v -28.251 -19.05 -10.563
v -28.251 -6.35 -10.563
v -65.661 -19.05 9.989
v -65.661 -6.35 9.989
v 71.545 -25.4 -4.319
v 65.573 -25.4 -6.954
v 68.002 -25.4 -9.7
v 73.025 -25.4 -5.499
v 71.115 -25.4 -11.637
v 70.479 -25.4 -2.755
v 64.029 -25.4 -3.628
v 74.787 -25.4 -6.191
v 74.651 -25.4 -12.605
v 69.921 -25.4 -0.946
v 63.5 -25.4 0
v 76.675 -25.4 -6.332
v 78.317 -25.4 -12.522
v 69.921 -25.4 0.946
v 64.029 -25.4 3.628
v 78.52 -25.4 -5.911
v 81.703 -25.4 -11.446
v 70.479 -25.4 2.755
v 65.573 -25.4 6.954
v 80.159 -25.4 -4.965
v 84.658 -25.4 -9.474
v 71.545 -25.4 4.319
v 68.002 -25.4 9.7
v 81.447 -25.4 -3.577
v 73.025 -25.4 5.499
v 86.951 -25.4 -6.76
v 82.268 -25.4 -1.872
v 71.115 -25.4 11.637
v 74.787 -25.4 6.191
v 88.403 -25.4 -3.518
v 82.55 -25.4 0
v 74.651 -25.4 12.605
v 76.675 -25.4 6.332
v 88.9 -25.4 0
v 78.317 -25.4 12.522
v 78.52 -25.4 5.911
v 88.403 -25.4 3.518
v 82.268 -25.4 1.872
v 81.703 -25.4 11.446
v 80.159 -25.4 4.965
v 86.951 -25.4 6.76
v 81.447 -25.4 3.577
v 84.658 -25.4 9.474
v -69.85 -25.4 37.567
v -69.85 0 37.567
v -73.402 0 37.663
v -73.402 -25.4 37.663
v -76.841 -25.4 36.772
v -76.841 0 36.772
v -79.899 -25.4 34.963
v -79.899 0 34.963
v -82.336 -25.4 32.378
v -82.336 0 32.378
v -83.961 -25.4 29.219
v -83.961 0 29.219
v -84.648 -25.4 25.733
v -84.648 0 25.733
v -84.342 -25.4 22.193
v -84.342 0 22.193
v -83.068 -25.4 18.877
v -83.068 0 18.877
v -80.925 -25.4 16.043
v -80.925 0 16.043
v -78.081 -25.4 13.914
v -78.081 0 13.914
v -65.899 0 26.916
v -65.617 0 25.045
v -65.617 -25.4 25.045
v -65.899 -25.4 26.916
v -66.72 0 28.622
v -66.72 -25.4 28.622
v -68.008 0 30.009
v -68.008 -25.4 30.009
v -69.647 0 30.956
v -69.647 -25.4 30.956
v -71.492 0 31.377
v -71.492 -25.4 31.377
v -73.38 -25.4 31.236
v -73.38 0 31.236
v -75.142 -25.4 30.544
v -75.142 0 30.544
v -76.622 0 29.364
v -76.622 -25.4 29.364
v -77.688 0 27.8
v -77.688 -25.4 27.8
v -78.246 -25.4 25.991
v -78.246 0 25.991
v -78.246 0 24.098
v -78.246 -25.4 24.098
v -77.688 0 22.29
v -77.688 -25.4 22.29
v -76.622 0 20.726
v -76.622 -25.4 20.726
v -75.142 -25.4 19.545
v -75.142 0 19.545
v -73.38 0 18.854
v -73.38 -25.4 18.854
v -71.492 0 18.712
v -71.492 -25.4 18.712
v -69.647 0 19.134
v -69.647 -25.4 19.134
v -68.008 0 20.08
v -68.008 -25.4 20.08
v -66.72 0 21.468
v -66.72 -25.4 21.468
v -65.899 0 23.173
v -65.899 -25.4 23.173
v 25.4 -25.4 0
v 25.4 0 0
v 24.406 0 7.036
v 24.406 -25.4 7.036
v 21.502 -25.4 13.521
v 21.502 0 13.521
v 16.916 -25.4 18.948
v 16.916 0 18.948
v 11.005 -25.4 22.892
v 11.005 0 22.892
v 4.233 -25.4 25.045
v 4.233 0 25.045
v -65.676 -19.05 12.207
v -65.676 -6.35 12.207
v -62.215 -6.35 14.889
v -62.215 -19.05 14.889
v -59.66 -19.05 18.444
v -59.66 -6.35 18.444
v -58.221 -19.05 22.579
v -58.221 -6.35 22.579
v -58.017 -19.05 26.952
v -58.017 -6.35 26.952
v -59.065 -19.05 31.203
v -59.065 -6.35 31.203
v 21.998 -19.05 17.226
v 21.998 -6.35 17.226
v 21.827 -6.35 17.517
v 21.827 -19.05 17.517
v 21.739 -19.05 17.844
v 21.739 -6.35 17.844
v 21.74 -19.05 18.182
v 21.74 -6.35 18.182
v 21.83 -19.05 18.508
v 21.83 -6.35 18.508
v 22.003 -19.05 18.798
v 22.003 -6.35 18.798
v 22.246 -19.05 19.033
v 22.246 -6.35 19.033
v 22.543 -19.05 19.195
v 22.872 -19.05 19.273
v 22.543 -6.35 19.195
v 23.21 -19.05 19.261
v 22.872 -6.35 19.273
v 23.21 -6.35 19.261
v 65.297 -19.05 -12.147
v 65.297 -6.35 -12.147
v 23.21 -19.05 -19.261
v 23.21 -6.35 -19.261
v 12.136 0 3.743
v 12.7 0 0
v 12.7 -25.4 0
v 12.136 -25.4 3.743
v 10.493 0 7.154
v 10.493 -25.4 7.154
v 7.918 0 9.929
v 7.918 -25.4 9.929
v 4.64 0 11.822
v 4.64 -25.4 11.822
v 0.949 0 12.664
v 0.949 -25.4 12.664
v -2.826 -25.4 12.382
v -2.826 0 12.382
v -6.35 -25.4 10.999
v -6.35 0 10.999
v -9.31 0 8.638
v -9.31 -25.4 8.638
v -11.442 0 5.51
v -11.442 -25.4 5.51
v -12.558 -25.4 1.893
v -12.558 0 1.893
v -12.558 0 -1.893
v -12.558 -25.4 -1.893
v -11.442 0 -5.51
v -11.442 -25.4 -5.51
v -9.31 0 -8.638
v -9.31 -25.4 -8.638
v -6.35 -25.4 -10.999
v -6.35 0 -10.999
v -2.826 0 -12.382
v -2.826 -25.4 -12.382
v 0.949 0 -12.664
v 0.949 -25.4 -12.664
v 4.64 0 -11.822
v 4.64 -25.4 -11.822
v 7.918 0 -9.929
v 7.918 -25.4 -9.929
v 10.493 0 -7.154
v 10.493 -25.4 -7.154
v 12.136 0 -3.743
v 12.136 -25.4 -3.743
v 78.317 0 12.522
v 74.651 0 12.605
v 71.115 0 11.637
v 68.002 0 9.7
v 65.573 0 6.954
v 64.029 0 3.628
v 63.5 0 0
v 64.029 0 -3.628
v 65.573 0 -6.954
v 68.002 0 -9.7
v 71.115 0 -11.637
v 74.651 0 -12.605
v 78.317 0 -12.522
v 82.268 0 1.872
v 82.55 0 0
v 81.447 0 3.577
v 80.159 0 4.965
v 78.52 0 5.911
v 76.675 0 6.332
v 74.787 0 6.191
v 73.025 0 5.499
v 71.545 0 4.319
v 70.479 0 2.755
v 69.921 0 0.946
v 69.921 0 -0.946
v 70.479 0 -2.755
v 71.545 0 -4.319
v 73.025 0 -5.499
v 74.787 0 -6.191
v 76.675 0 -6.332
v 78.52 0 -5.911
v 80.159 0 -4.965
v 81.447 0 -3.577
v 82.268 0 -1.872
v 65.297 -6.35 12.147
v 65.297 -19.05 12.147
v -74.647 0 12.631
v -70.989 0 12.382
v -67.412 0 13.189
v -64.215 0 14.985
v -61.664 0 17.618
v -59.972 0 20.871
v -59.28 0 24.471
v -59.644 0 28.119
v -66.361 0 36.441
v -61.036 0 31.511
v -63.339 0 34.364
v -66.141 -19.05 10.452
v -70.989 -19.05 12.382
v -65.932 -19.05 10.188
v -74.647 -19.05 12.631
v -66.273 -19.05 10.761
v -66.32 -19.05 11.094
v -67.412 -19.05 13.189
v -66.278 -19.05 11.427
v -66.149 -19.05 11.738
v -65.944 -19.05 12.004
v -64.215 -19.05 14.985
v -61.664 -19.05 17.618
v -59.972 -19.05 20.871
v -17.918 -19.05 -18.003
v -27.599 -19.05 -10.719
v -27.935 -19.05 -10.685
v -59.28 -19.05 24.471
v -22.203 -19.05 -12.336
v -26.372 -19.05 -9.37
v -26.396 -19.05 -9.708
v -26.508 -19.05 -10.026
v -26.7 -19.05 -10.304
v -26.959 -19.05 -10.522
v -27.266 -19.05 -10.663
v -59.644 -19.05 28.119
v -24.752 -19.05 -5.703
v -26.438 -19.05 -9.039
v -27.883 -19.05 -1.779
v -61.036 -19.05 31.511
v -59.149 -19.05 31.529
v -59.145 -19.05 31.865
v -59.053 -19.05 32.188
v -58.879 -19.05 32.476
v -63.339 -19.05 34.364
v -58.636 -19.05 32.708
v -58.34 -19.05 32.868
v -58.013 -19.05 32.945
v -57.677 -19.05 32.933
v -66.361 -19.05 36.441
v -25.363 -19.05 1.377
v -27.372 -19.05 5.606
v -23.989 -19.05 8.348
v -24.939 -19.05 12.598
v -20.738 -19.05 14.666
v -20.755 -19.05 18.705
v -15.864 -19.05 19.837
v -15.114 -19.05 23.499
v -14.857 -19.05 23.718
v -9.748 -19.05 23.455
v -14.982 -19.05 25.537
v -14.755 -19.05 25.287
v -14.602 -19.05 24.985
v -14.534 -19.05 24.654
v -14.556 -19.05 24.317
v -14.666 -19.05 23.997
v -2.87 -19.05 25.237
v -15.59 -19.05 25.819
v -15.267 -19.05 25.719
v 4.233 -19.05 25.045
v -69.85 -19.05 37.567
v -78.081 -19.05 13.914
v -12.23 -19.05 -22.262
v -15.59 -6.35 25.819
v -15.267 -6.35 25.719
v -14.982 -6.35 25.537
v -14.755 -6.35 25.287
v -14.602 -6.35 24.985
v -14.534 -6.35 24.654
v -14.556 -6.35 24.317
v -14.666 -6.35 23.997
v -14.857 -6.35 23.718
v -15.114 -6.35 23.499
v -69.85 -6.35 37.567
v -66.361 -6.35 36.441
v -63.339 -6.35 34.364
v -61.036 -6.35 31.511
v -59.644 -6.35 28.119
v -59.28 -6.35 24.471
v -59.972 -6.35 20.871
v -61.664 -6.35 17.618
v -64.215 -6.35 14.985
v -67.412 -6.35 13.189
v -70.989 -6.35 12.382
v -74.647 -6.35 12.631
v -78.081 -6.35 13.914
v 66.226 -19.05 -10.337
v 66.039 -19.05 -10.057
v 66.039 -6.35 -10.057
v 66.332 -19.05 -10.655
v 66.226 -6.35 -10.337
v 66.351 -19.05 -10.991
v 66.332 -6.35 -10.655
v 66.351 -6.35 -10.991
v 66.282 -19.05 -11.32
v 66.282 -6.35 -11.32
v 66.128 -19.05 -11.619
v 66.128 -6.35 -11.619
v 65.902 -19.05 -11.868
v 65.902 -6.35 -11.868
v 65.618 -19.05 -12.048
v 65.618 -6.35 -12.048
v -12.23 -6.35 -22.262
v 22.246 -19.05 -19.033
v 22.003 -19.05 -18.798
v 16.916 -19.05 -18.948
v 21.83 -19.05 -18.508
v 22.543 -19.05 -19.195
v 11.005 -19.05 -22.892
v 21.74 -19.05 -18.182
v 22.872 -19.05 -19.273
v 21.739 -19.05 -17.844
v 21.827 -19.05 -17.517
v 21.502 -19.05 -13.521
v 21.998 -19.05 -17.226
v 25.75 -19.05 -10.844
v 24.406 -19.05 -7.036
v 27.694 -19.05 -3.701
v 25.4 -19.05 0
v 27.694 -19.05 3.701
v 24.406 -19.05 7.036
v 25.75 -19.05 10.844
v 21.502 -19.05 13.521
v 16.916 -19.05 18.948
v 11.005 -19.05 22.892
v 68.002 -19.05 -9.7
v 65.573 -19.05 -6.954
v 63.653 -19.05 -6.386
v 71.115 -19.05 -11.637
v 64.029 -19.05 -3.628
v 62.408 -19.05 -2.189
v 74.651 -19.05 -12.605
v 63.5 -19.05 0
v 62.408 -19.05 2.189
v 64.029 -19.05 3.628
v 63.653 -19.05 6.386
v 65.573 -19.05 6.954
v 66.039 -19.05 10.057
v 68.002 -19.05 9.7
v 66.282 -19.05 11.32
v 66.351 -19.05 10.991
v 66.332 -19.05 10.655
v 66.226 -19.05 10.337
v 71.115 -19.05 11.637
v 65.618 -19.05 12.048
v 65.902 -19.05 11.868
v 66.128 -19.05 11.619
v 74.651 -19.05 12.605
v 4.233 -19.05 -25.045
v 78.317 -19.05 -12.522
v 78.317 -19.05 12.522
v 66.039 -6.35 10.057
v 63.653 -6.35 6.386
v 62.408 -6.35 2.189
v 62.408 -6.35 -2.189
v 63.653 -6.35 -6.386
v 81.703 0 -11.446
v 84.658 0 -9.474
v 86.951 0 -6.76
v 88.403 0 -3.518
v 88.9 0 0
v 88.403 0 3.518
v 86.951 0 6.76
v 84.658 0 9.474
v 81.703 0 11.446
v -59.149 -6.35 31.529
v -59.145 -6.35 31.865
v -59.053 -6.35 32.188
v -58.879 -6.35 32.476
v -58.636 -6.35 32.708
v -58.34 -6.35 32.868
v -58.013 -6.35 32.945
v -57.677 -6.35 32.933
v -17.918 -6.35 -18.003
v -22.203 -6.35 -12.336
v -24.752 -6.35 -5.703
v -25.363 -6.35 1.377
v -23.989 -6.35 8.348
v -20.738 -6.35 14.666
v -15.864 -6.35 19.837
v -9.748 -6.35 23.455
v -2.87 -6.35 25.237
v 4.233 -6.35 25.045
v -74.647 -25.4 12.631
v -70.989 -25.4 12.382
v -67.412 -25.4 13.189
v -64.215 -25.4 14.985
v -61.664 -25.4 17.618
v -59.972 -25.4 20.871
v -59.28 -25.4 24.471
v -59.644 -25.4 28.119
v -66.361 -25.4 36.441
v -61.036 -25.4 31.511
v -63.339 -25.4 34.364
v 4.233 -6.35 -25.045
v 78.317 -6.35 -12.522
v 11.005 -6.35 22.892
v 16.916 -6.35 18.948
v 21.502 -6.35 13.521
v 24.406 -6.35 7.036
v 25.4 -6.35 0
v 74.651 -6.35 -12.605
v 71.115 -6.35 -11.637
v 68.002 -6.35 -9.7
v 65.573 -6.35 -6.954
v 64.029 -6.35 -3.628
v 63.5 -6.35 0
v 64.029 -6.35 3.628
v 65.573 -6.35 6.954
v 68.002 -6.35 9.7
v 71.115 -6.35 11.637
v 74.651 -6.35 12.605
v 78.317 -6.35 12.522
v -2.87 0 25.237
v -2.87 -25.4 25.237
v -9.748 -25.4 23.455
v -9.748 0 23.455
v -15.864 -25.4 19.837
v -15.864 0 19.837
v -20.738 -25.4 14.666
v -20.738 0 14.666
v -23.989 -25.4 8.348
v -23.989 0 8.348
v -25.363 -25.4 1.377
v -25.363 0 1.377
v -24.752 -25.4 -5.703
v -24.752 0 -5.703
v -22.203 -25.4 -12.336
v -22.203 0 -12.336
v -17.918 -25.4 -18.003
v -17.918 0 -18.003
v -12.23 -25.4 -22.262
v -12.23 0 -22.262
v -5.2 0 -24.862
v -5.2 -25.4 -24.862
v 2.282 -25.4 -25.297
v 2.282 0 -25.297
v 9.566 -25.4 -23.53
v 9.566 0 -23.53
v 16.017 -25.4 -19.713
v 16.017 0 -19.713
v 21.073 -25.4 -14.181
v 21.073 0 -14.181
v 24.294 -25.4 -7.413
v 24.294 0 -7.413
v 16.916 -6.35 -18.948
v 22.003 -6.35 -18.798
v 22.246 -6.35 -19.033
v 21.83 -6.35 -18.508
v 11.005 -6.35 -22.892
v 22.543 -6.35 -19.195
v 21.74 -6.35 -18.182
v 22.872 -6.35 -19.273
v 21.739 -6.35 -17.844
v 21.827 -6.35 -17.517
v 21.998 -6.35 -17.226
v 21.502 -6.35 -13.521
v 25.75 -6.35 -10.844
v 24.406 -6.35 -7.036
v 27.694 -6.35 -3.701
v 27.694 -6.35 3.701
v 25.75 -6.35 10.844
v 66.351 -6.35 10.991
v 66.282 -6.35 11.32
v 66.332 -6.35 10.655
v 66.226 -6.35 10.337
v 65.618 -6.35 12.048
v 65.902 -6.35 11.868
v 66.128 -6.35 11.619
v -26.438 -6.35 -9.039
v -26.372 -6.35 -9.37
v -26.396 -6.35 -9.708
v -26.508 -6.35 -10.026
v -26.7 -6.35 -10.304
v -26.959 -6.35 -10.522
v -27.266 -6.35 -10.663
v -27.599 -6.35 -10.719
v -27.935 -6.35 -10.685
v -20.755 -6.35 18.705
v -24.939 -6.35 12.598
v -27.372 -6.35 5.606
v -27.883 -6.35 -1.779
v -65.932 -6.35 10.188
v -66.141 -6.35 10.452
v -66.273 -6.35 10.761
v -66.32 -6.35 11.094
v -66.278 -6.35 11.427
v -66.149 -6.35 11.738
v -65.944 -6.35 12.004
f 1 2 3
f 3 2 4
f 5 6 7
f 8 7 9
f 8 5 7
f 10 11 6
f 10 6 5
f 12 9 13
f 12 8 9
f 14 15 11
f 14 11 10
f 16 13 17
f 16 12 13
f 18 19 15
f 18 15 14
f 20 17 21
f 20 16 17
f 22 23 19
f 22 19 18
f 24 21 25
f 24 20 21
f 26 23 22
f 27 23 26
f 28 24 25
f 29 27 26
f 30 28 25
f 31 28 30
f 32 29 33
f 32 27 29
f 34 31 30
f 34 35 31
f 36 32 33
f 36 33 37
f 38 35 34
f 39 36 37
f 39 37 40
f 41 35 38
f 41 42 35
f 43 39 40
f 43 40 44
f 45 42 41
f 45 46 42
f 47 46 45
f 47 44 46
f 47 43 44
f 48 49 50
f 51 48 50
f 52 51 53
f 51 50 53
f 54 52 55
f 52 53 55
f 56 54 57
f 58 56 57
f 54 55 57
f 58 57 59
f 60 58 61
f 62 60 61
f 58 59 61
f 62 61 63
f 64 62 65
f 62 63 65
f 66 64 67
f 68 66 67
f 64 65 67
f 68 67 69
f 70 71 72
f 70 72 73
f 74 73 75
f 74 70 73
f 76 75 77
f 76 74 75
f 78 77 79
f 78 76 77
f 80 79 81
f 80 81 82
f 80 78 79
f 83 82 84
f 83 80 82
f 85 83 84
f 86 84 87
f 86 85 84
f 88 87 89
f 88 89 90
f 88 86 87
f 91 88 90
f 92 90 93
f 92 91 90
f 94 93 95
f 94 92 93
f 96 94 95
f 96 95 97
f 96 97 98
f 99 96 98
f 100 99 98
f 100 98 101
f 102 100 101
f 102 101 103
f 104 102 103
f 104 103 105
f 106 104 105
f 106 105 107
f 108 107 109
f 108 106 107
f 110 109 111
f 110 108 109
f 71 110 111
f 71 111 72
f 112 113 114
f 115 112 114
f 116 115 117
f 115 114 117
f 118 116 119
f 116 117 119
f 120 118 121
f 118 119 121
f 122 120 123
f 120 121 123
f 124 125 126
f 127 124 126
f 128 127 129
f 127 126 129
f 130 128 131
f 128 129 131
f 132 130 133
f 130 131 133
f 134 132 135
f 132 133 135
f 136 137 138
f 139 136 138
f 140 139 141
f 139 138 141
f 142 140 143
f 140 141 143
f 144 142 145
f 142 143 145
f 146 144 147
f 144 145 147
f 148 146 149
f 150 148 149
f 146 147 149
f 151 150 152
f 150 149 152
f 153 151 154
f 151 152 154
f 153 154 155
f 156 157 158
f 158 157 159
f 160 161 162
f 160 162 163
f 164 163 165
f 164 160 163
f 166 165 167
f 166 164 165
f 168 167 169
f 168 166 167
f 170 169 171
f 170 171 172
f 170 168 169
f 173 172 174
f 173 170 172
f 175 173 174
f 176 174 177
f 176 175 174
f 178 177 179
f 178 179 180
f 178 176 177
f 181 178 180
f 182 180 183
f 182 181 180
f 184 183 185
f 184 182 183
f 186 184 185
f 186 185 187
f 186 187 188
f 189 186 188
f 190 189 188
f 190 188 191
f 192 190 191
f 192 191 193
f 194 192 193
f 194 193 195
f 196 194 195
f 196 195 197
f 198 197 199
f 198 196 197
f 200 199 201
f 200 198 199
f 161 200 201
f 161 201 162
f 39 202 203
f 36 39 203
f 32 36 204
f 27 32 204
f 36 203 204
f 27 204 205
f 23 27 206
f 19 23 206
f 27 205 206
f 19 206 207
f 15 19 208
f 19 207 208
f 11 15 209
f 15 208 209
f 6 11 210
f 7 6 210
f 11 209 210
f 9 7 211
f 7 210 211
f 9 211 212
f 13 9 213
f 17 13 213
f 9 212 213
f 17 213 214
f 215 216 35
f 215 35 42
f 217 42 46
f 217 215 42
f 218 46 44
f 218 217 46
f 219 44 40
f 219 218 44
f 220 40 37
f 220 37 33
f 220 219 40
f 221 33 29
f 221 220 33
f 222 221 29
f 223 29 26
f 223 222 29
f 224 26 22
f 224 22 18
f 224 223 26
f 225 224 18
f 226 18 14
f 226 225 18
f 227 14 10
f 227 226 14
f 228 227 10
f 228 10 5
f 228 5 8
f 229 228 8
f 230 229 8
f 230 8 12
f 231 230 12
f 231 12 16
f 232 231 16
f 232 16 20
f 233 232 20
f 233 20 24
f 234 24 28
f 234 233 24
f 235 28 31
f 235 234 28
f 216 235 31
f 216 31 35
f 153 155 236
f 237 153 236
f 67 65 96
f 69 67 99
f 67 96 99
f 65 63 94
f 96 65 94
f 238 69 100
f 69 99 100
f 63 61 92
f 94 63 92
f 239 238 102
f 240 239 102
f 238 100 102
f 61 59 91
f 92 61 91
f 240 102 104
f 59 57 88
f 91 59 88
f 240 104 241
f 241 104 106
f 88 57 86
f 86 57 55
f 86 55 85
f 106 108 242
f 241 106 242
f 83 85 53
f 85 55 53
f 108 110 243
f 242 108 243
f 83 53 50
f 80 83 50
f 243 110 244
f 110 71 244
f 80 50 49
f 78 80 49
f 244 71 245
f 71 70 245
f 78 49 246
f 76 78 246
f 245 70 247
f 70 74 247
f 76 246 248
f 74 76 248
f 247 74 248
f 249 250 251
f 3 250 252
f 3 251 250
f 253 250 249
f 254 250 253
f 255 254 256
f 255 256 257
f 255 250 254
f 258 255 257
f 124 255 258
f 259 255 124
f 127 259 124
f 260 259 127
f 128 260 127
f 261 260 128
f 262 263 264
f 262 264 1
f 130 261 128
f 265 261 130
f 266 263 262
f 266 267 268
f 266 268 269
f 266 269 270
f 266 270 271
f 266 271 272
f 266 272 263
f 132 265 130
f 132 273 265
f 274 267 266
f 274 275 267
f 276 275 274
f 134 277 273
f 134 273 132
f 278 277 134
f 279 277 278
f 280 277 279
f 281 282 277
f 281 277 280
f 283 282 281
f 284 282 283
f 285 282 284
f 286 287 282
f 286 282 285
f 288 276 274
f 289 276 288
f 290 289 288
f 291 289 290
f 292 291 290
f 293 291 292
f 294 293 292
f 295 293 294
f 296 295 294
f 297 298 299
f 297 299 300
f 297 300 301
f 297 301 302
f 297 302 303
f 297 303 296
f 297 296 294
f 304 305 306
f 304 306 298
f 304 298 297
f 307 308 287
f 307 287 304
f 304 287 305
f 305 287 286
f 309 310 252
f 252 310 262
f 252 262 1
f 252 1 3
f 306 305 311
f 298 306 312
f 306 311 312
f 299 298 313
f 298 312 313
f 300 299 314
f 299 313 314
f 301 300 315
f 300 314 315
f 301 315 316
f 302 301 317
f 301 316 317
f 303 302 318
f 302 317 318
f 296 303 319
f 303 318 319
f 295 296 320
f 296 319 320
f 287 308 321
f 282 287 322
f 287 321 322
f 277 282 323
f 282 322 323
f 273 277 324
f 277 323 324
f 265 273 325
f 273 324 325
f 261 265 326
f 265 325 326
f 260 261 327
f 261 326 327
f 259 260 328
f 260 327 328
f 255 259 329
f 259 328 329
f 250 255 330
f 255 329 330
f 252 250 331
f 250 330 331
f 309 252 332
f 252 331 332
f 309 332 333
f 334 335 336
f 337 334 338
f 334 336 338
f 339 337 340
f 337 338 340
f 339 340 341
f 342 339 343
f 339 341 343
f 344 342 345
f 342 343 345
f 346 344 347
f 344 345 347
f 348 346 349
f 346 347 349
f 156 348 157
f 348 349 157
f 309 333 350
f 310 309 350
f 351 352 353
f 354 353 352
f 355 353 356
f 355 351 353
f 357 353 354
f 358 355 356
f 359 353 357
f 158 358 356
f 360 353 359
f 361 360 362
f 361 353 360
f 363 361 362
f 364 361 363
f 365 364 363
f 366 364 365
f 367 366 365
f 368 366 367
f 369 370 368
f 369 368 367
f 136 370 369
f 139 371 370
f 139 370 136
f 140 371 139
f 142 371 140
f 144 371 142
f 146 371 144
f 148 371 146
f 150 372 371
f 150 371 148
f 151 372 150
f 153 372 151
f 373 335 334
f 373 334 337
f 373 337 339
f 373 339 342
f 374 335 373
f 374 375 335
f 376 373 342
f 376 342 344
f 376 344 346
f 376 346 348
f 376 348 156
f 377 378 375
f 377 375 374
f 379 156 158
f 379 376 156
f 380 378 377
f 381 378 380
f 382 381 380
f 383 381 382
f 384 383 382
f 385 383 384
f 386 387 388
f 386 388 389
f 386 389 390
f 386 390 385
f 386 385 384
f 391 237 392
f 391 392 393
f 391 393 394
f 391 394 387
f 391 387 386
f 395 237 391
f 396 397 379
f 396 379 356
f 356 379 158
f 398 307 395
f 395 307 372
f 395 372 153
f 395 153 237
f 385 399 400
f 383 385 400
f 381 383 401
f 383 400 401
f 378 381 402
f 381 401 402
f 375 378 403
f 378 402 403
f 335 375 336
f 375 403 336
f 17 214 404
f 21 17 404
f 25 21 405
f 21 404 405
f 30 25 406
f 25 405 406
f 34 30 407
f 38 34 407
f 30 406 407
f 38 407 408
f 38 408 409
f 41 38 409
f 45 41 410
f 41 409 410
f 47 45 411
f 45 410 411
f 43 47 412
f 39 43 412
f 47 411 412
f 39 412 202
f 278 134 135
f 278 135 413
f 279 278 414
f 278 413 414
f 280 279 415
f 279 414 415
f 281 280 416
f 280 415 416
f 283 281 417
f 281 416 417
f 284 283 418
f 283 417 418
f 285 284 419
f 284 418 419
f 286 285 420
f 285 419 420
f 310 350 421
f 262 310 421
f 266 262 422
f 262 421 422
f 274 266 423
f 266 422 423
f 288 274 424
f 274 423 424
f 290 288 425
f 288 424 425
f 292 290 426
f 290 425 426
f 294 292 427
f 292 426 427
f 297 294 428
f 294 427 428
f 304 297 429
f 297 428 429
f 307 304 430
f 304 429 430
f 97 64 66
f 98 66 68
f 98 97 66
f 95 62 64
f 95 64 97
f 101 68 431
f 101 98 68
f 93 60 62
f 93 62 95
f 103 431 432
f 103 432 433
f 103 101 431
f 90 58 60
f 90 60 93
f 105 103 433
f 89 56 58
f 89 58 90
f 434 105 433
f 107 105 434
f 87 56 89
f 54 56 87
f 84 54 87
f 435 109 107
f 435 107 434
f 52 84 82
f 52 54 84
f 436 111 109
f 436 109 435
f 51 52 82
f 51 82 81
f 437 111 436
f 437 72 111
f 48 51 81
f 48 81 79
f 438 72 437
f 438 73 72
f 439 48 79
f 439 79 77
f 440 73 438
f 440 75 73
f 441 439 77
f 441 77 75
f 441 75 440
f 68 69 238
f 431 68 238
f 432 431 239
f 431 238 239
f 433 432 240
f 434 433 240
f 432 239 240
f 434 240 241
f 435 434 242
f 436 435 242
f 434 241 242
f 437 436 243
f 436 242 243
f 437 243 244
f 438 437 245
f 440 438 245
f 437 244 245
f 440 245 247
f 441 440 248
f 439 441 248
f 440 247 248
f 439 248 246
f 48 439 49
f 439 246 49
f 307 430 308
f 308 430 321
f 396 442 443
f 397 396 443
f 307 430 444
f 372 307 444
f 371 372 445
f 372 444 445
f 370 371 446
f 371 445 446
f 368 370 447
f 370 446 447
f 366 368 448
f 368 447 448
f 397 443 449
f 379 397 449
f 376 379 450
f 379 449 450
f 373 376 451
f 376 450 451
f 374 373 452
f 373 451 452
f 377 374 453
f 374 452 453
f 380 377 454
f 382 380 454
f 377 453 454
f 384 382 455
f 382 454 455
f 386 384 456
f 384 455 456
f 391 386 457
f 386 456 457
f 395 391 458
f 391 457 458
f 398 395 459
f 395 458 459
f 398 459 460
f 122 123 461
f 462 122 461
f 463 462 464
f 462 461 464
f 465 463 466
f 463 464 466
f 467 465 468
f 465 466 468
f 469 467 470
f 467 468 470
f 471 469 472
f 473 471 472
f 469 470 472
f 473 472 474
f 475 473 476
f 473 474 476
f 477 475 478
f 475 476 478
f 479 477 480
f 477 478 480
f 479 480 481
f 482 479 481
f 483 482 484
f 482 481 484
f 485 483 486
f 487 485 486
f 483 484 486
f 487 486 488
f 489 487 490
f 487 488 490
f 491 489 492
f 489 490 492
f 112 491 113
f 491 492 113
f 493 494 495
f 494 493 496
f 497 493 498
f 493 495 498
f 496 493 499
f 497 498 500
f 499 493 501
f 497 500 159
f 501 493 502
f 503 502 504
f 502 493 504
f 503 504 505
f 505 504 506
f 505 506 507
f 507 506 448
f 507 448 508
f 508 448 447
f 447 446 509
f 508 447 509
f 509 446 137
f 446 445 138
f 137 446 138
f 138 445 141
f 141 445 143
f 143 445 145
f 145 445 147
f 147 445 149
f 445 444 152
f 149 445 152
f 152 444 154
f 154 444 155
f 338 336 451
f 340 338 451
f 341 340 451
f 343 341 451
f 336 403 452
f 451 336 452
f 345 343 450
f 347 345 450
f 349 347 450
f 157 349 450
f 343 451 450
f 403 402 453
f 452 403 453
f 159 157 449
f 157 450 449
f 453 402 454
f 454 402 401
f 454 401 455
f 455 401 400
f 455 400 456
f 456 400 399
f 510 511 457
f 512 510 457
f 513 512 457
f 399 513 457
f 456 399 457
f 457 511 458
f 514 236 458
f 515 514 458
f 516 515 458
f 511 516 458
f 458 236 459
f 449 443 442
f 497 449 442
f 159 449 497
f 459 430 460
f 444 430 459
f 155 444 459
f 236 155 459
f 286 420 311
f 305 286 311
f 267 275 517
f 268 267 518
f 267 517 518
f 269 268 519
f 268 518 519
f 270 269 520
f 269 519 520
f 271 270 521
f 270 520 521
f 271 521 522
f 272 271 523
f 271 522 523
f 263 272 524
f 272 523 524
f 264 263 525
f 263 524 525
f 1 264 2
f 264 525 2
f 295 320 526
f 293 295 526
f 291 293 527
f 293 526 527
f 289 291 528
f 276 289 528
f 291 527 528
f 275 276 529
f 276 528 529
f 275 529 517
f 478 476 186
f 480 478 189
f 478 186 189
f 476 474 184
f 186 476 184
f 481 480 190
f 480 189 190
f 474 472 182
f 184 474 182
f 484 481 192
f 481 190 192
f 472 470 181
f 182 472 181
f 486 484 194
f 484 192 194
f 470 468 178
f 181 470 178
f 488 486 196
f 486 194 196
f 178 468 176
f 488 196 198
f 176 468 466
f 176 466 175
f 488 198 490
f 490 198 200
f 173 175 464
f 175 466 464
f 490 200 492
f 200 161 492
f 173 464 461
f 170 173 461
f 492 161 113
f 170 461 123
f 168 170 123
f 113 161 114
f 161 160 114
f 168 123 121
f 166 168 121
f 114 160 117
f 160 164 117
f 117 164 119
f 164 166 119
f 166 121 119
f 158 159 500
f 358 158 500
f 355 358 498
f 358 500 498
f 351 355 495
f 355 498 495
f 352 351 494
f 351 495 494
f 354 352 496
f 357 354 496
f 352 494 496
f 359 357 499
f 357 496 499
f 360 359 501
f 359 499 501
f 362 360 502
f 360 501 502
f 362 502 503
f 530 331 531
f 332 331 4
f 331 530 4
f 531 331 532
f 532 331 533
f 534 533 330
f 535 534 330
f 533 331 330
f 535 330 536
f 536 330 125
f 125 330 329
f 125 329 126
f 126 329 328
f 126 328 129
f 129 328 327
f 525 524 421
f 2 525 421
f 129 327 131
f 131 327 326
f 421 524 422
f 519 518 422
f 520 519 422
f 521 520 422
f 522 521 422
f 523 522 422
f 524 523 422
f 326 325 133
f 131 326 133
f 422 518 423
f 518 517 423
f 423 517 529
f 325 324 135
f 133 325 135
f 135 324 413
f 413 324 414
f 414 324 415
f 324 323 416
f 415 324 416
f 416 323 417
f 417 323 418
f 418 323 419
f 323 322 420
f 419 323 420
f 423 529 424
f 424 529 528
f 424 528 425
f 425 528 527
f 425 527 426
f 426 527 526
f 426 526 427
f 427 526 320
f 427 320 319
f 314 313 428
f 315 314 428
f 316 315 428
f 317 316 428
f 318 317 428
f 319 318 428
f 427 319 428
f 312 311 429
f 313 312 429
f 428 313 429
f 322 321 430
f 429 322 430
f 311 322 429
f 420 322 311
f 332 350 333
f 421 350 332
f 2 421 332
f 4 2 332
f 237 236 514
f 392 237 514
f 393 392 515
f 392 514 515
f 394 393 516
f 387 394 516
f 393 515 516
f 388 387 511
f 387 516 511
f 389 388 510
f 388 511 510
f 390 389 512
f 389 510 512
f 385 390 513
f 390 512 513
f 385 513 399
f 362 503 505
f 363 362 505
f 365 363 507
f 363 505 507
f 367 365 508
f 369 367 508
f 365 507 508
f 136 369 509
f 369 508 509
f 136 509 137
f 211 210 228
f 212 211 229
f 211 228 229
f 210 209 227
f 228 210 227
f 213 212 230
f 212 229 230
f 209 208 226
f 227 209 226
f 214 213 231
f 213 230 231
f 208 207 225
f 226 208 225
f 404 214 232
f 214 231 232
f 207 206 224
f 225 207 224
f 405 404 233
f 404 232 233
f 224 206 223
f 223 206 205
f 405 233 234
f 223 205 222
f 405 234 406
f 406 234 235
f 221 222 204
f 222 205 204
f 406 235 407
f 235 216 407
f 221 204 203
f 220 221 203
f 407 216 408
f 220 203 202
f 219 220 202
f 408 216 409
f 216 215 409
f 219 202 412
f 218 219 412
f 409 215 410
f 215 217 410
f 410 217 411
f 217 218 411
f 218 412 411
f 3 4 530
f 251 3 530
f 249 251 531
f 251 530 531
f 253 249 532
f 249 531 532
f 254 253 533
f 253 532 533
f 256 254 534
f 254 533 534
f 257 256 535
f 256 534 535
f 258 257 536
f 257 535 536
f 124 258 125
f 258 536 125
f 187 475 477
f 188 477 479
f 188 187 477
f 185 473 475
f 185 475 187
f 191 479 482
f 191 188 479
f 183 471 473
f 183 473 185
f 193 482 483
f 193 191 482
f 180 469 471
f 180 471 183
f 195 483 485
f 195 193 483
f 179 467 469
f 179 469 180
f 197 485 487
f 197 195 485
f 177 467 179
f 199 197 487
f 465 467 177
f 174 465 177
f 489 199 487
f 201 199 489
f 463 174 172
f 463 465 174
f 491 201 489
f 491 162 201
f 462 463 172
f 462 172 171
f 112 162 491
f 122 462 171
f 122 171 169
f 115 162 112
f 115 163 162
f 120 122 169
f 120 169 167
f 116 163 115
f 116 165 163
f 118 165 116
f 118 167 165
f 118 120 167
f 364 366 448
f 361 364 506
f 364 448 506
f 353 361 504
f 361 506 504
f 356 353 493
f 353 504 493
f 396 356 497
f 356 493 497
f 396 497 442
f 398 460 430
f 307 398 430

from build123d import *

# Parameters (mm, degrees)
F0_R     = 12.7
F1_DEPTH = 25.4
F0_R_2   = 6.35
F2_DEPTH = 25.4
F3_DEPTH = 6.35
F4_DEPTH = 6.35


with BuildPart() as f1:
    # F0 (on Front) → F1 (new body)
    with BuildSketch(Plane.XZ):
        with BuildLine():
            ThreePointArc((4.2333333333, -25.0447377485), (19.399570442, -16.3956294989), (25.4, 0))
            ThreePointArc((25.4, 0), (19.399570442, 16.3956294989), (4.2333333333, 25.0447377485))
            ThreePointArc((4.2333333333, 25.0447377485), (-23.9888888889, 8.3482459162), (-12.2296296296, -22.2619891097))
            ThreePointArc((-12.2296296296, -22.2619891097), (-4.2333333333, -25.0447377485), (4.2333333333, -25.0447377485))
        make_face()
        Circle(F0_R, mode=Mode.SUBTRACT)
    extrude(amount=F1_DEPTH)


with BuildPart() as f1b:
    # F0 (on Front) → F1, piece 2 (new body)
    with BuildSketch(Plane.XZ):
        with BuildLine():
            ThreePointArc((88.9, 0), (85.899785221, 8.1978147495), (78.3166666667, 12.5223688742))
            ThreePointArc((78.3166666667, 12.5223688742), (63.5, 0), (78.3166666667, -12.5223688742))
            ThreePointArc((78.3166666667, -12.5223688742), (85.899785221, -8.1978147495), (88.9, 0))
        make_face()
        with Locations((76.2, 0)):
            Circle(F0_R_2, mode=Mode.SUBTRACT)
    extrude(amount=F1_DEPTH)


with BuildPart() as f1c:
    # F0 (on Front) → F1, piece 3 (new body)
    with BuildSketch(Plane.XZ):
        with BuildLine():
            ThreePointArc((-59.2666666667, 25.0447377485), (-62.2668814457, 33.2425524979), (-69.85, 37.5671066227))
            ThreePointArc((-69.85, 37.5671066227), (-83.9611111111, 29.2188607065), (-78.0814814815, 13.9137431936))
            ThreePointArc((-78.0814814815, 13.9137431936), (-65.500143186, 14.1143180825), (-59.2666666667, 25.0447377485))
        make_face()
        with Locations((-71.9666666667, 25.0447377485)):
            Circle(F0_R_2, mode=Mode.SUBTRACT)
    extrude(amount=F1_DEPTH)


with BuildPart() as f2:
    # F0 (on Front) → F2 (new body)
    with BuildSketch(Plane.XZ):
        with BuildLine():
            ThreePointArc((4.2333333333, 25.0447377485), (19.399570442, 16.3956294989), (25.4, 0))
            ThreePointArc((25.4, 0), (19.399570442, -16.3956294989), (4.2333333333, -25.0447377485))
            Line((4.2333333333, -25.0447377485), (78.3166666667, -12.5223688742))
            ThreePointArc((78.3166666667, -12.5223688742), (63.5, 0), (78.3166666667, 12.5223688742))
            Line((78.3166666667, 12.5223688742), (4.2333333333, 25.0447377485))
        make_face()
        with BuildLine():
            ThreePointArc((21.9979949155, 17.2259054826), (21.9066318734, 18.6585361887), (23.209570442, 19.2611380738))
            Line((23.209570442, 19.2611380738), (65.296593229, 12.1471327984))
            ThreePointArc((65.296593229, 12.1471327984), (66.281659176, 11.320020659), (66.0391490163, 10.0568269947))
            ThreePointArc((66.0391490163, 10.0568269947), (62.2498184639, 0), (66.0391490163, -10.0568269947))
            ThreePointArc((66.0391490163, -10.0568269947), (66.281659176, -11.320020659), (65.296593229, -12.1471327984))
            Line((65.296593229, -12.1471327984), (23.209570442, -19.2611380738))
            ThreePointArc((23.209570442, -19.2611380738), (21.9066318734, -18.6585361887), (21.9979949155, -17.2259054826))
            ThreePointArc((21.9979949155, -17.2259054826), (27.94, 0), (21.9979949155, 17.2259054826))
        make_face(mode=Mode.SUBTRACT)
    extrude(amount=F2_DEPTH)


with BuildPart() as f2b:
    # F0 (on Front) → F2, piece 2 (new body)
    with BuildSketch(Plane.XZ):
        with BuildLine():
            ThreePointArc((-12.2296296296, -22.2619891097), (-23.9888888889, 8.3482459162), (4.2333333333, 25.0447377485))
            Line((4.2333333333, 25.0447377485), (-69.85, 37.5671066227))
            ThreePointArc((-69.85, 37.5671066227), (-62.2668814457, 33.2425524979), (-59.2666666667, 25.0447377485))
            ThreePointArc((-59.2666666667, 25.0447377485), (-65.500143186, 14.1143180825), (-78.0814814815, 13.9137431936))
            Line((-78.0814814815, 13.9137431936), (-12.2296296296, -22.2619891097))
        make_face()
        with BuildLine():
            ThreePointArc((-65.6756957857, 12.2070453043), (-58.7914952159, 20.4597162509), (-59.0649190228, 31.2032740721))
            ThreePointArc((-59.0649190228, 31.2032740721), (-58.8787811459, 32.4759963913), (-57.676593229, 32.9333951489))
            Line((-57.676593229, 32.9333951489), (-15.589570442, 25.8193898734))
            ThreePointArc((-15.589570442, 25.8193898734), (-14.5570751734, 24.8220276194), (-15.1142267996, 23.4990158996))
            ThreePointArc((-15.1142267996, 23.4990158996), (-26.3877777778, 9.1830705078), (-26.4375413742, -9.0388055676))
            ThreePointArc((-26.4375413742, -9.0388055676), (-26.8221183654, -10.4218740703), (-28.2507292818, -10.5627598216))
            Line((-28.2507292818, -10.5627598216), (-65.6614162035, 9.9888109742))
            ThreePointArc((-65.6614162035, 9.9888109742), (-66.3199084087, 11.0937351466), (-65.6756957857, 12.2070453043))
        make_face(mode=Mode.SUBTRACT)
    extrude(amount=F2_DEPTH)


with BuildPart() as f3_tool:
    # F0 (on Front) → F3 (new body)
    with BuildSketch(Plane.XZ):
        with BuildLine():
            ThreePointArc((4.2333333333, 25.0447377485), (19.399570442, 16.3956294989), (25.4, 0))
            ThreePointArc((25.4, 0), (19.399570442, -16.3956294989), (4.2333333333, -25.0447377485))
            Line((4.2333333333, -25.0447377485), (78.3166666667, -12.5223688742))
            ThreePointArc((78.3166666667, -12.5223688742), (63.5, 0), (78.3166666667, 12.5223688742))
            Line((78.3166666667, 12.5223688742), (4.2333333333, 25.0447377485))
        make_face()
        with BuildLine():
            ThreePointArc((21.9979949155, 17.2259054826), (21.9066318734, 18.6585361887), (23.209570442, 19.2611380738))
            Line((23.209570442, 19.2611380738), (65.296593229, 12.1471327984))
            ThreePointArc((65.296593229, 12.1471327984), (66.281659176, 11.320020659), (66.0391490163, 10.0568269947))
            ThreePointArc((66.0391490163, 10.0568269947), (62.2498184639, 0), (66.0391490163, -10.0568269947))
            ThreePointArc((66.0391490163, -10.0568269947), (66.281659176, -11.320020659), (65.296593229, -12.1471327984))
            Line((65.296593229, -12.1471327984), (23.209570442, -19.2611380738))
            ThreePointArc((23.209570442, -19.2611380738), (21.9066318734, -18.6585361887), (21.9979949155, -17.2259054826))
            ThreePointArc((21.9979949155, -17.2259054826), (27.94, 0), (21.9979949155, 17.2259054826))
        make_face(mode=Mode.SUBTRACT)
        with BuildLine():
            ThreePointArc((-12.2296296296, -22.2619891097), (-23.9888888889, 8.3482459162), (4.2333333333, 25.0447377485))
            Line((4.2333333333, 25.0447377485), (-69.85, 37.5671066227))
            ThreePointArc((-69.85, 37.5671066227), (-62.2668814457, 33.2425524979), (-59.2666666667, 25.0447377485))
            ThreePointArc((-59.2666666667, 25.0447377485), (-65.500143186, 14.1143180825), (-78.0814814815, 13.9137431936))
            Line((-78.0814814815, 13.9137431936), (-12.2296296296, -22.2619891097))
        make_face()
        with BuildLine():
            ThreePointArc((-65.6756957857, 12.2070453043), (-58.7914952159, 20.4597162509), (-59.0649190228, 31.2032740721))
            ThreePointArc((-59.0649190228, 31.2032740721), (-58.8787811459, 32.4759963913), (-57.676593229, 32.9333951489))
            Line((-57.676593229, 32.9333951489), (-15.589570442, 25.8193898734))
            ThreePointArc((-15.589570442, 25.8193898734), (-14.5570751734, 24.8220276194), (-15.1142267996, 23.4990158996))
            ThreePointArc((-15.1142267996, 23.4990158996), (-26.3877777778, 9.1830705078), (-26.4375413742, -9.0388055676))
            ThreePointArc((-26.4375413742, -9.0388055676), (-26.8221183654, -10.4218740703), (-28.2507292818, -10.5627598216))
            Line((-28.2507292818, -10.5627598216), (-65.6614162035, 9.9888109742))
            ThreePointArc((-65.6614162035, 9.9888109742), (-66.3199084087, 11.0937351466), (-65.6756957857, 12.2070453043))
        make_face(mode=Mode.SUBTRACT)
    extrude(amount=F3_DEPTH)


with BuildPart() as f2_1:
    add(f2.part)

    # F3: cut by f3_tool
    add(f3_tool.part, mode=Mode.SUBTRACT)


with BuildPart() as f2b_1:
    add(f2b.part)

    # F3: cut by f3_tool
    add(f3_tool.part, mode=Mode.SUBTRACT)


with BuildPart() as f4_tool:
    # F2_face (on face) → F4 (new body)
    with BuildSketch(Plane(origin=(-37.2218426901, -25.4, 12.9533759429), x_dir=(1, 0, 0), z_dir=(0, -1, 0))):
        with BuildLine():
            ThreePointArc((24.9922130605, -35.2153650526), (13.2329538012, -4.6051300267), (41.4551760235, 12.0913618056))
            Line((41.4551760235, 12.0913618056), (-32.6281573099, 24.6137306798))
            ThreePointArc((-32.6281573099, 24.6137306798), (-22.7503795321, 7.9172388475), (-40.8596387913, 0.9603672507))
            Line((-40.8596387913, 0.9603672507), (24.9922130605, -35.2153650526))
        make_face()
        with BuildLine():
            ThreePointArc((-28.4538530955, -0.7463306385), (-21.5696525258, 7.506340308), (-21.8430763327, 18.2498981293))
            ThreePointArc((-21.8430763327, 18.2498981293), (-21.6569384558, 19.5226204485), (-20.4547505388, 19.980019206))
            Line((-20.4547505388, 19.980019206), (21.6322722482, 12.8660139305))
            ThreePointArc((21.6322722482, 12.8660139305), (22.6647675168, 11.8686516766), (22.1076158906, 10.5456399568))
            ThreePointArc((22.1076158906, 10.5456399568), (10.8340649124, -3.7703054351), (10.784301316, -21.9921815105))
            ThreePointArc((10.784301316, -21.9921815105), (10.3997243248, -23.3752500132), (8.9711134084, -23.5161357645))
            Line((8.9711134084, -23.5161357645), (-28.4395735134, -2.9645649687))
            ThreePointArc((-28.4395735134, -2.9645649687), (-29.0980657186, -1.8596407963), (-28.4538530955, -0.7463306385))
        make_face(mode=Mode.SUBTRACT)
        with BuildLine():
            ThreePointArc((41.4551760235, 12.0913618056), (62.6218426901, -12.9533759429), (41.4551760235, -37.9981136913))
            Line((41.4551760235, -37.9981136913), (115.5385093568, -25.4757448171))
            ThreePointArc((115.5385093568, -25.4757448171), (100.7218426901, -12.9533759429), (115.5385093568, -0.4310070686))
            Line((115.5385093568, -0.4310070686), (41.4551760235, 12.0913618056))
        make_face()
        with BuildLine():
            ThreePointArc((60.4314131321, -32.2145140167), (59.1284745636, -31.6119121316), (59.2198376056, -30.1792814255))
            ThreePointArc((59.2198376056, -30.1792814255), (65.1618426901, -12.9533759429), (59.2198376056, 4.2725295398))
            ThreePointArc((59.2198376056, 4.2725295398), (59.1284745636, 5.7051602458), (60.4314131321, 6.3077621309))
            Line((60.4314131321, 6.3077621309), (102.5184359191, -0.8062431445))
            ThreePointArc((102.5184359191, -0.8062431445), (103.5035018661, -1.6333552839), (103.2609917064, -2.8965489482))
            ThreePointArc((103.2609917064, -2.8965489482), (99.471661154, -12.9533759429), (103.2609917064, -23.0102029376))
            ThreePointArc((103.2609917064, -23.0102029376), (103.5035018661, -24.2733966019), (102.5184359191, -25.1005087412))
            Line((102.5184359191, -25.1005087412), (60.4314131321, -32.2145140167))
        make_face(mode=Mode.SUBTRACT)
    extrude(amount=-F4_DEPTH)


with BuildPart() as f2_2:
    add(f2_1.part)

    # F4: cut by f4_tool
    add(f4_tool.part, mode=Mode.SUBTRACT)


with BuildPart() as f2b_2:
    add(f2b_1.part)

    # F4: cut by f4_tool
    add(f4_tool.part, mode=Mode.SUBTRACT)


solid = Compound([f1.part, f1b.part, f1c.part, f2_2.part, f2b_2.part])
